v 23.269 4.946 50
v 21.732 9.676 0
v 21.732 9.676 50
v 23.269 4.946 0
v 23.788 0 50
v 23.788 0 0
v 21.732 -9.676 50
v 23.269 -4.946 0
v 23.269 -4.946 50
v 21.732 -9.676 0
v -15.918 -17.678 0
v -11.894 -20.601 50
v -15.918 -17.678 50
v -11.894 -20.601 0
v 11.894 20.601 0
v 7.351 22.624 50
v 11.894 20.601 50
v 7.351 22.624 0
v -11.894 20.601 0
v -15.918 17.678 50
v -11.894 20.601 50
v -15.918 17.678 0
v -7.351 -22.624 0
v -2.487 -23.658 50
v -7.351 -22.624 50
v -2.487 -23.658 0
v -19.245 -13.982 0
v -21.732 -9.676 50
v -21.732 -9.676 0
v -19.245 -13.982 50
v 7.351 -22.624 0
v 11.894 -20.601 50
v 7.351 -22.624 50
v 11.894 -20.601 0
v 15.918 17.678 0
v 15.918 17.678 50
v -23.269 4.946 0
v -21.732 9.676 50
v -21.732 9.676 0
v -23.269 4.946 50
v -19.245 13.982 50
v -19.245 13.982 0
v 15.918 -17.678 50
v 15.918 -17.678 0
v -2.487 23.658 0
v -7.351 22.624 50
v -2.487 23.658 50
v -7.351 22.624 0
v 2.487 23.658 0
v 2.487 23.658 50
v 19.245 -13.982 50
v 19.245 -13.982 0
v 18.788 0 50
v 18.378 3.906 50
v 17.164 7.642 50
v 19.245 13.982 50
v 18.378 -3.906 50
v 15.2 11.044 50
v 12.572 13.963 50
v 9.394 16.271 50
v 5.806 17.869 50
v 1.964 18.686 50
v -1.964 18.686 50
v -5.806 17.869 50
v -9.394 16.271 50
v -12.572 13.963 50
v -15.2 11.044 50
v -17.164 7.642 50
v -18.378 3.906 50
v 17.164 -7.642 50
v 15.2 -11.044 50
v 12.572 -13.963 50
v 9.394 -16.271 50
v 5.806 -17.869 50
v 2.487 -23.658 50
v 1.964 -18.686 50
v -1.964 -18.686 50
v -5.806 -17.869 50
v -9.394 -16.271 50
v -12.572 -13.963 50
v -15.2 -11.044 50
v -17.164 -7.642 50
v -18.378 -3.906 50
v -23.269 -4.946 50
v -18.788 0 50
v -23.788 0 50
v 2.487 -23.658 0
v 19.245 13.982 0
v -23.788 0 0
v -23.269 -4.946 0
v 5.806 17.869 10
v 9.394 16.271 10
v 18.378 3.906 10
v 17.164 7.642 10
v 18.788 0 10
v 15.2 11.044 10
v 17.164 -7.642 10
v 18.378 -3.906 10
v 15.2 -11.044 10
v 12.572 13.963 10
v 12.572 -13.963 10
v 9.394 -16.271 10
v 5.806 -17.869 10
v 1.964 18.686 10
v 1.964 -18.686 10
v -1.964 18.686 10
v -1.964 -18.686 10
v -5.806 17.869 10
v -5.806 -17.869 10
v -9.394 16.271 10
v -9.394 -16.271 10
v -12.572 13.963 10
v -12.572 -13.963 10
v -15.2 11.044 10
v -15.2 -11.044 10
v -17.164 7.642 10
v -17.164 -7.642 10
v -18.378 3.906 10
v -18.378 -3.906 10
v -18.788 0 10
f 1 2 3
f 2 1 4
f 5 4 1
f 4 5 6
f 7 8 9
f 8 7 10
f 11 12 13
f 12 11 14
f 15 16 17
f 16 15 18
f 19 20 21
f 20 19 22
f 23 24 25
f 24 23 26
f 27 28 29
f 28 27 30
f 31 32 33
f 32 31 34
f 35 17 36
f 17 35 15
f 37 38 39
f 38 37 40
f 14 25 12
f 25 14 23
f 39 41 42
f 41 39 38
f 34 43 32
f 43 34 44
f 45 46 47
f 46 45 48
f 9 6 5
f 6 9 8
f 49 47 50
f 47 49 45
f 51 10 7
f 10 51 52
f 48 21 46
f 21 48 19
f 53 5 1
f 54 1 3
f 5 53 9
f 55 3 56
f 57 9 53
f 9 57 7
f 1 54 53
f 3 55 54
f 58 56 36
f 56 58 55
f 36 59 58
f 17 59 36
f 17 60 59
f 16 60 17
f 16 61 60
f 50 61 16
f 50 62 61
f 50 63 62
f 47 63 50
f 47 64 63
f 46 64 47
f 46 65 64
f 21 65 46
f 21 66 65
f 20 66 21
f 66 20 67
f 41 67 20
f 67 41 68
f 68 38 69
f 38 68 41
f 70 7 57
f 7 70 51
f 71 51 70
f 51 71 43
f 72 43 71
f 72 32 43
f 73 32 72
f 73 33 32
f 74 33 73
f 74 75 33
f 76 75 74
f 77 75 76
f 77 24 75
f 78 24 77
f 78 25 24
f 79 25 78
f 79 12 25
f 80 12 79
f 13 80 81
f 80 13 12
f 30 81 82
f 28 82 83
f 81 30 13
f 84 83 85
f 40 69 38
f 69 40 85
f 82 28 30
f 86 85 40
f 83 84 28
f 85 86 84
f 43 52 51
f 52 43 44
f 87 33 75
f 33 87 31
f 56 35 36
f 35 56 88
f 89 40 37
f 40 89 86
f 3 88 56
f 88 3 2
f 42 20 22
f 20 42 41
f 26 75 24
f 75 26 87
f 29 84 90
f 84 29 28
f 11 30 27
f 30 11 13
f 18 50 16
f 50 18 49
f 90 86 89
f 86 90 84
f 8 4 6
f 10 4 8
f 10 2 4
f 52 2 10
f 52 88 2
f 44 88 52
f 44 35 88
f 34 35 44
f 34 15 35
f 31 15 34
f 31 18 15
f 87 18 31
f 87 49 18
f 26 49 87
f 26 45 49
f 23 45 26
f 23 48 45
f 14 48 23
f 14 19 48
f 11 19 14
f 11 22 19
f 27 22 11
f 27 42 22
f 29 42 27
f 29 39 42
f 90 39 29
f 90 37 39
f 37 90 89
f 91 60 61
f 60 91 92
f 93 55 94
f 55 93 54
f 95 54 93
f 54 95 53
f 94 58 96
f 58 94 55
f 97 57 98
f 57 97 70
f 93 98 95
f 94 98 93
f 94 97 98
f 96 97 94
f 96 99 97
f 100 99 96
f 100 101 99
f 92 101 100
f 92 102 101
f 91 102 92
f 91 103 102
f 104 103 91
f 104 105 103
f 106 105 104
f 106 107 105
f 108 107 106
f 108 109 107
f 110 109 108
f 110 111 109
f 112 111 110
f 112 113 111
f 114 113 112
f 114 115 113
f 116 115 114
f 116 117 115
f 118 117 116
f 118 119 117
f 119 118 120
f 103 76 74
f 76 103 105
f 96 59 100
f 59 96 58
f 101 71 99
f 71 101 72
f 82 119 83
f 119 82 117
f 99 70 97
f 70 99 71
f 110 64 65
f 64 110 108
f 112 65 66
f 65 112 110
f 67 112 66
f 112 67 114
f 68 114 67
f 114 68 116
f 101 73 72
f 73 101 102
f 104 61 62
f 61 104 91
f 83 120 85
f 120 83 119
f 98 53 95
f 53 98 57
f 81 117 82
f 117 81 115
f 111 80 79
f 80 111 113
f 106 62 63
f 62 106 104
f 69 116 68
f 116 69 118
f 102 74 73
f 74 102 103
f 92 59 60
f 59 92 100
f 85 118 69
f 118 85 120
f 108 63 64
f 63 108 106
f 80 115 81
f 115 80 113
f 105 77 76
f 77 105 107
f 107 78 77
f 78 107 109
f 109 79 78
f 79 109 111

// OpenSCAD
//set radius

//How many shots would you like 
shots=1;


height=40*shots;

module outside(){
    cylinder(height+10,18.78844+5,18.78844+5,[0,0,(height/2)]);
}

module inside(){
    translate([0,0,10])cylinder(height+1,18.78844,18.78844);
}

module shotglass(){
difference(){
    outside();
    inside();
}
}
shotglass();
